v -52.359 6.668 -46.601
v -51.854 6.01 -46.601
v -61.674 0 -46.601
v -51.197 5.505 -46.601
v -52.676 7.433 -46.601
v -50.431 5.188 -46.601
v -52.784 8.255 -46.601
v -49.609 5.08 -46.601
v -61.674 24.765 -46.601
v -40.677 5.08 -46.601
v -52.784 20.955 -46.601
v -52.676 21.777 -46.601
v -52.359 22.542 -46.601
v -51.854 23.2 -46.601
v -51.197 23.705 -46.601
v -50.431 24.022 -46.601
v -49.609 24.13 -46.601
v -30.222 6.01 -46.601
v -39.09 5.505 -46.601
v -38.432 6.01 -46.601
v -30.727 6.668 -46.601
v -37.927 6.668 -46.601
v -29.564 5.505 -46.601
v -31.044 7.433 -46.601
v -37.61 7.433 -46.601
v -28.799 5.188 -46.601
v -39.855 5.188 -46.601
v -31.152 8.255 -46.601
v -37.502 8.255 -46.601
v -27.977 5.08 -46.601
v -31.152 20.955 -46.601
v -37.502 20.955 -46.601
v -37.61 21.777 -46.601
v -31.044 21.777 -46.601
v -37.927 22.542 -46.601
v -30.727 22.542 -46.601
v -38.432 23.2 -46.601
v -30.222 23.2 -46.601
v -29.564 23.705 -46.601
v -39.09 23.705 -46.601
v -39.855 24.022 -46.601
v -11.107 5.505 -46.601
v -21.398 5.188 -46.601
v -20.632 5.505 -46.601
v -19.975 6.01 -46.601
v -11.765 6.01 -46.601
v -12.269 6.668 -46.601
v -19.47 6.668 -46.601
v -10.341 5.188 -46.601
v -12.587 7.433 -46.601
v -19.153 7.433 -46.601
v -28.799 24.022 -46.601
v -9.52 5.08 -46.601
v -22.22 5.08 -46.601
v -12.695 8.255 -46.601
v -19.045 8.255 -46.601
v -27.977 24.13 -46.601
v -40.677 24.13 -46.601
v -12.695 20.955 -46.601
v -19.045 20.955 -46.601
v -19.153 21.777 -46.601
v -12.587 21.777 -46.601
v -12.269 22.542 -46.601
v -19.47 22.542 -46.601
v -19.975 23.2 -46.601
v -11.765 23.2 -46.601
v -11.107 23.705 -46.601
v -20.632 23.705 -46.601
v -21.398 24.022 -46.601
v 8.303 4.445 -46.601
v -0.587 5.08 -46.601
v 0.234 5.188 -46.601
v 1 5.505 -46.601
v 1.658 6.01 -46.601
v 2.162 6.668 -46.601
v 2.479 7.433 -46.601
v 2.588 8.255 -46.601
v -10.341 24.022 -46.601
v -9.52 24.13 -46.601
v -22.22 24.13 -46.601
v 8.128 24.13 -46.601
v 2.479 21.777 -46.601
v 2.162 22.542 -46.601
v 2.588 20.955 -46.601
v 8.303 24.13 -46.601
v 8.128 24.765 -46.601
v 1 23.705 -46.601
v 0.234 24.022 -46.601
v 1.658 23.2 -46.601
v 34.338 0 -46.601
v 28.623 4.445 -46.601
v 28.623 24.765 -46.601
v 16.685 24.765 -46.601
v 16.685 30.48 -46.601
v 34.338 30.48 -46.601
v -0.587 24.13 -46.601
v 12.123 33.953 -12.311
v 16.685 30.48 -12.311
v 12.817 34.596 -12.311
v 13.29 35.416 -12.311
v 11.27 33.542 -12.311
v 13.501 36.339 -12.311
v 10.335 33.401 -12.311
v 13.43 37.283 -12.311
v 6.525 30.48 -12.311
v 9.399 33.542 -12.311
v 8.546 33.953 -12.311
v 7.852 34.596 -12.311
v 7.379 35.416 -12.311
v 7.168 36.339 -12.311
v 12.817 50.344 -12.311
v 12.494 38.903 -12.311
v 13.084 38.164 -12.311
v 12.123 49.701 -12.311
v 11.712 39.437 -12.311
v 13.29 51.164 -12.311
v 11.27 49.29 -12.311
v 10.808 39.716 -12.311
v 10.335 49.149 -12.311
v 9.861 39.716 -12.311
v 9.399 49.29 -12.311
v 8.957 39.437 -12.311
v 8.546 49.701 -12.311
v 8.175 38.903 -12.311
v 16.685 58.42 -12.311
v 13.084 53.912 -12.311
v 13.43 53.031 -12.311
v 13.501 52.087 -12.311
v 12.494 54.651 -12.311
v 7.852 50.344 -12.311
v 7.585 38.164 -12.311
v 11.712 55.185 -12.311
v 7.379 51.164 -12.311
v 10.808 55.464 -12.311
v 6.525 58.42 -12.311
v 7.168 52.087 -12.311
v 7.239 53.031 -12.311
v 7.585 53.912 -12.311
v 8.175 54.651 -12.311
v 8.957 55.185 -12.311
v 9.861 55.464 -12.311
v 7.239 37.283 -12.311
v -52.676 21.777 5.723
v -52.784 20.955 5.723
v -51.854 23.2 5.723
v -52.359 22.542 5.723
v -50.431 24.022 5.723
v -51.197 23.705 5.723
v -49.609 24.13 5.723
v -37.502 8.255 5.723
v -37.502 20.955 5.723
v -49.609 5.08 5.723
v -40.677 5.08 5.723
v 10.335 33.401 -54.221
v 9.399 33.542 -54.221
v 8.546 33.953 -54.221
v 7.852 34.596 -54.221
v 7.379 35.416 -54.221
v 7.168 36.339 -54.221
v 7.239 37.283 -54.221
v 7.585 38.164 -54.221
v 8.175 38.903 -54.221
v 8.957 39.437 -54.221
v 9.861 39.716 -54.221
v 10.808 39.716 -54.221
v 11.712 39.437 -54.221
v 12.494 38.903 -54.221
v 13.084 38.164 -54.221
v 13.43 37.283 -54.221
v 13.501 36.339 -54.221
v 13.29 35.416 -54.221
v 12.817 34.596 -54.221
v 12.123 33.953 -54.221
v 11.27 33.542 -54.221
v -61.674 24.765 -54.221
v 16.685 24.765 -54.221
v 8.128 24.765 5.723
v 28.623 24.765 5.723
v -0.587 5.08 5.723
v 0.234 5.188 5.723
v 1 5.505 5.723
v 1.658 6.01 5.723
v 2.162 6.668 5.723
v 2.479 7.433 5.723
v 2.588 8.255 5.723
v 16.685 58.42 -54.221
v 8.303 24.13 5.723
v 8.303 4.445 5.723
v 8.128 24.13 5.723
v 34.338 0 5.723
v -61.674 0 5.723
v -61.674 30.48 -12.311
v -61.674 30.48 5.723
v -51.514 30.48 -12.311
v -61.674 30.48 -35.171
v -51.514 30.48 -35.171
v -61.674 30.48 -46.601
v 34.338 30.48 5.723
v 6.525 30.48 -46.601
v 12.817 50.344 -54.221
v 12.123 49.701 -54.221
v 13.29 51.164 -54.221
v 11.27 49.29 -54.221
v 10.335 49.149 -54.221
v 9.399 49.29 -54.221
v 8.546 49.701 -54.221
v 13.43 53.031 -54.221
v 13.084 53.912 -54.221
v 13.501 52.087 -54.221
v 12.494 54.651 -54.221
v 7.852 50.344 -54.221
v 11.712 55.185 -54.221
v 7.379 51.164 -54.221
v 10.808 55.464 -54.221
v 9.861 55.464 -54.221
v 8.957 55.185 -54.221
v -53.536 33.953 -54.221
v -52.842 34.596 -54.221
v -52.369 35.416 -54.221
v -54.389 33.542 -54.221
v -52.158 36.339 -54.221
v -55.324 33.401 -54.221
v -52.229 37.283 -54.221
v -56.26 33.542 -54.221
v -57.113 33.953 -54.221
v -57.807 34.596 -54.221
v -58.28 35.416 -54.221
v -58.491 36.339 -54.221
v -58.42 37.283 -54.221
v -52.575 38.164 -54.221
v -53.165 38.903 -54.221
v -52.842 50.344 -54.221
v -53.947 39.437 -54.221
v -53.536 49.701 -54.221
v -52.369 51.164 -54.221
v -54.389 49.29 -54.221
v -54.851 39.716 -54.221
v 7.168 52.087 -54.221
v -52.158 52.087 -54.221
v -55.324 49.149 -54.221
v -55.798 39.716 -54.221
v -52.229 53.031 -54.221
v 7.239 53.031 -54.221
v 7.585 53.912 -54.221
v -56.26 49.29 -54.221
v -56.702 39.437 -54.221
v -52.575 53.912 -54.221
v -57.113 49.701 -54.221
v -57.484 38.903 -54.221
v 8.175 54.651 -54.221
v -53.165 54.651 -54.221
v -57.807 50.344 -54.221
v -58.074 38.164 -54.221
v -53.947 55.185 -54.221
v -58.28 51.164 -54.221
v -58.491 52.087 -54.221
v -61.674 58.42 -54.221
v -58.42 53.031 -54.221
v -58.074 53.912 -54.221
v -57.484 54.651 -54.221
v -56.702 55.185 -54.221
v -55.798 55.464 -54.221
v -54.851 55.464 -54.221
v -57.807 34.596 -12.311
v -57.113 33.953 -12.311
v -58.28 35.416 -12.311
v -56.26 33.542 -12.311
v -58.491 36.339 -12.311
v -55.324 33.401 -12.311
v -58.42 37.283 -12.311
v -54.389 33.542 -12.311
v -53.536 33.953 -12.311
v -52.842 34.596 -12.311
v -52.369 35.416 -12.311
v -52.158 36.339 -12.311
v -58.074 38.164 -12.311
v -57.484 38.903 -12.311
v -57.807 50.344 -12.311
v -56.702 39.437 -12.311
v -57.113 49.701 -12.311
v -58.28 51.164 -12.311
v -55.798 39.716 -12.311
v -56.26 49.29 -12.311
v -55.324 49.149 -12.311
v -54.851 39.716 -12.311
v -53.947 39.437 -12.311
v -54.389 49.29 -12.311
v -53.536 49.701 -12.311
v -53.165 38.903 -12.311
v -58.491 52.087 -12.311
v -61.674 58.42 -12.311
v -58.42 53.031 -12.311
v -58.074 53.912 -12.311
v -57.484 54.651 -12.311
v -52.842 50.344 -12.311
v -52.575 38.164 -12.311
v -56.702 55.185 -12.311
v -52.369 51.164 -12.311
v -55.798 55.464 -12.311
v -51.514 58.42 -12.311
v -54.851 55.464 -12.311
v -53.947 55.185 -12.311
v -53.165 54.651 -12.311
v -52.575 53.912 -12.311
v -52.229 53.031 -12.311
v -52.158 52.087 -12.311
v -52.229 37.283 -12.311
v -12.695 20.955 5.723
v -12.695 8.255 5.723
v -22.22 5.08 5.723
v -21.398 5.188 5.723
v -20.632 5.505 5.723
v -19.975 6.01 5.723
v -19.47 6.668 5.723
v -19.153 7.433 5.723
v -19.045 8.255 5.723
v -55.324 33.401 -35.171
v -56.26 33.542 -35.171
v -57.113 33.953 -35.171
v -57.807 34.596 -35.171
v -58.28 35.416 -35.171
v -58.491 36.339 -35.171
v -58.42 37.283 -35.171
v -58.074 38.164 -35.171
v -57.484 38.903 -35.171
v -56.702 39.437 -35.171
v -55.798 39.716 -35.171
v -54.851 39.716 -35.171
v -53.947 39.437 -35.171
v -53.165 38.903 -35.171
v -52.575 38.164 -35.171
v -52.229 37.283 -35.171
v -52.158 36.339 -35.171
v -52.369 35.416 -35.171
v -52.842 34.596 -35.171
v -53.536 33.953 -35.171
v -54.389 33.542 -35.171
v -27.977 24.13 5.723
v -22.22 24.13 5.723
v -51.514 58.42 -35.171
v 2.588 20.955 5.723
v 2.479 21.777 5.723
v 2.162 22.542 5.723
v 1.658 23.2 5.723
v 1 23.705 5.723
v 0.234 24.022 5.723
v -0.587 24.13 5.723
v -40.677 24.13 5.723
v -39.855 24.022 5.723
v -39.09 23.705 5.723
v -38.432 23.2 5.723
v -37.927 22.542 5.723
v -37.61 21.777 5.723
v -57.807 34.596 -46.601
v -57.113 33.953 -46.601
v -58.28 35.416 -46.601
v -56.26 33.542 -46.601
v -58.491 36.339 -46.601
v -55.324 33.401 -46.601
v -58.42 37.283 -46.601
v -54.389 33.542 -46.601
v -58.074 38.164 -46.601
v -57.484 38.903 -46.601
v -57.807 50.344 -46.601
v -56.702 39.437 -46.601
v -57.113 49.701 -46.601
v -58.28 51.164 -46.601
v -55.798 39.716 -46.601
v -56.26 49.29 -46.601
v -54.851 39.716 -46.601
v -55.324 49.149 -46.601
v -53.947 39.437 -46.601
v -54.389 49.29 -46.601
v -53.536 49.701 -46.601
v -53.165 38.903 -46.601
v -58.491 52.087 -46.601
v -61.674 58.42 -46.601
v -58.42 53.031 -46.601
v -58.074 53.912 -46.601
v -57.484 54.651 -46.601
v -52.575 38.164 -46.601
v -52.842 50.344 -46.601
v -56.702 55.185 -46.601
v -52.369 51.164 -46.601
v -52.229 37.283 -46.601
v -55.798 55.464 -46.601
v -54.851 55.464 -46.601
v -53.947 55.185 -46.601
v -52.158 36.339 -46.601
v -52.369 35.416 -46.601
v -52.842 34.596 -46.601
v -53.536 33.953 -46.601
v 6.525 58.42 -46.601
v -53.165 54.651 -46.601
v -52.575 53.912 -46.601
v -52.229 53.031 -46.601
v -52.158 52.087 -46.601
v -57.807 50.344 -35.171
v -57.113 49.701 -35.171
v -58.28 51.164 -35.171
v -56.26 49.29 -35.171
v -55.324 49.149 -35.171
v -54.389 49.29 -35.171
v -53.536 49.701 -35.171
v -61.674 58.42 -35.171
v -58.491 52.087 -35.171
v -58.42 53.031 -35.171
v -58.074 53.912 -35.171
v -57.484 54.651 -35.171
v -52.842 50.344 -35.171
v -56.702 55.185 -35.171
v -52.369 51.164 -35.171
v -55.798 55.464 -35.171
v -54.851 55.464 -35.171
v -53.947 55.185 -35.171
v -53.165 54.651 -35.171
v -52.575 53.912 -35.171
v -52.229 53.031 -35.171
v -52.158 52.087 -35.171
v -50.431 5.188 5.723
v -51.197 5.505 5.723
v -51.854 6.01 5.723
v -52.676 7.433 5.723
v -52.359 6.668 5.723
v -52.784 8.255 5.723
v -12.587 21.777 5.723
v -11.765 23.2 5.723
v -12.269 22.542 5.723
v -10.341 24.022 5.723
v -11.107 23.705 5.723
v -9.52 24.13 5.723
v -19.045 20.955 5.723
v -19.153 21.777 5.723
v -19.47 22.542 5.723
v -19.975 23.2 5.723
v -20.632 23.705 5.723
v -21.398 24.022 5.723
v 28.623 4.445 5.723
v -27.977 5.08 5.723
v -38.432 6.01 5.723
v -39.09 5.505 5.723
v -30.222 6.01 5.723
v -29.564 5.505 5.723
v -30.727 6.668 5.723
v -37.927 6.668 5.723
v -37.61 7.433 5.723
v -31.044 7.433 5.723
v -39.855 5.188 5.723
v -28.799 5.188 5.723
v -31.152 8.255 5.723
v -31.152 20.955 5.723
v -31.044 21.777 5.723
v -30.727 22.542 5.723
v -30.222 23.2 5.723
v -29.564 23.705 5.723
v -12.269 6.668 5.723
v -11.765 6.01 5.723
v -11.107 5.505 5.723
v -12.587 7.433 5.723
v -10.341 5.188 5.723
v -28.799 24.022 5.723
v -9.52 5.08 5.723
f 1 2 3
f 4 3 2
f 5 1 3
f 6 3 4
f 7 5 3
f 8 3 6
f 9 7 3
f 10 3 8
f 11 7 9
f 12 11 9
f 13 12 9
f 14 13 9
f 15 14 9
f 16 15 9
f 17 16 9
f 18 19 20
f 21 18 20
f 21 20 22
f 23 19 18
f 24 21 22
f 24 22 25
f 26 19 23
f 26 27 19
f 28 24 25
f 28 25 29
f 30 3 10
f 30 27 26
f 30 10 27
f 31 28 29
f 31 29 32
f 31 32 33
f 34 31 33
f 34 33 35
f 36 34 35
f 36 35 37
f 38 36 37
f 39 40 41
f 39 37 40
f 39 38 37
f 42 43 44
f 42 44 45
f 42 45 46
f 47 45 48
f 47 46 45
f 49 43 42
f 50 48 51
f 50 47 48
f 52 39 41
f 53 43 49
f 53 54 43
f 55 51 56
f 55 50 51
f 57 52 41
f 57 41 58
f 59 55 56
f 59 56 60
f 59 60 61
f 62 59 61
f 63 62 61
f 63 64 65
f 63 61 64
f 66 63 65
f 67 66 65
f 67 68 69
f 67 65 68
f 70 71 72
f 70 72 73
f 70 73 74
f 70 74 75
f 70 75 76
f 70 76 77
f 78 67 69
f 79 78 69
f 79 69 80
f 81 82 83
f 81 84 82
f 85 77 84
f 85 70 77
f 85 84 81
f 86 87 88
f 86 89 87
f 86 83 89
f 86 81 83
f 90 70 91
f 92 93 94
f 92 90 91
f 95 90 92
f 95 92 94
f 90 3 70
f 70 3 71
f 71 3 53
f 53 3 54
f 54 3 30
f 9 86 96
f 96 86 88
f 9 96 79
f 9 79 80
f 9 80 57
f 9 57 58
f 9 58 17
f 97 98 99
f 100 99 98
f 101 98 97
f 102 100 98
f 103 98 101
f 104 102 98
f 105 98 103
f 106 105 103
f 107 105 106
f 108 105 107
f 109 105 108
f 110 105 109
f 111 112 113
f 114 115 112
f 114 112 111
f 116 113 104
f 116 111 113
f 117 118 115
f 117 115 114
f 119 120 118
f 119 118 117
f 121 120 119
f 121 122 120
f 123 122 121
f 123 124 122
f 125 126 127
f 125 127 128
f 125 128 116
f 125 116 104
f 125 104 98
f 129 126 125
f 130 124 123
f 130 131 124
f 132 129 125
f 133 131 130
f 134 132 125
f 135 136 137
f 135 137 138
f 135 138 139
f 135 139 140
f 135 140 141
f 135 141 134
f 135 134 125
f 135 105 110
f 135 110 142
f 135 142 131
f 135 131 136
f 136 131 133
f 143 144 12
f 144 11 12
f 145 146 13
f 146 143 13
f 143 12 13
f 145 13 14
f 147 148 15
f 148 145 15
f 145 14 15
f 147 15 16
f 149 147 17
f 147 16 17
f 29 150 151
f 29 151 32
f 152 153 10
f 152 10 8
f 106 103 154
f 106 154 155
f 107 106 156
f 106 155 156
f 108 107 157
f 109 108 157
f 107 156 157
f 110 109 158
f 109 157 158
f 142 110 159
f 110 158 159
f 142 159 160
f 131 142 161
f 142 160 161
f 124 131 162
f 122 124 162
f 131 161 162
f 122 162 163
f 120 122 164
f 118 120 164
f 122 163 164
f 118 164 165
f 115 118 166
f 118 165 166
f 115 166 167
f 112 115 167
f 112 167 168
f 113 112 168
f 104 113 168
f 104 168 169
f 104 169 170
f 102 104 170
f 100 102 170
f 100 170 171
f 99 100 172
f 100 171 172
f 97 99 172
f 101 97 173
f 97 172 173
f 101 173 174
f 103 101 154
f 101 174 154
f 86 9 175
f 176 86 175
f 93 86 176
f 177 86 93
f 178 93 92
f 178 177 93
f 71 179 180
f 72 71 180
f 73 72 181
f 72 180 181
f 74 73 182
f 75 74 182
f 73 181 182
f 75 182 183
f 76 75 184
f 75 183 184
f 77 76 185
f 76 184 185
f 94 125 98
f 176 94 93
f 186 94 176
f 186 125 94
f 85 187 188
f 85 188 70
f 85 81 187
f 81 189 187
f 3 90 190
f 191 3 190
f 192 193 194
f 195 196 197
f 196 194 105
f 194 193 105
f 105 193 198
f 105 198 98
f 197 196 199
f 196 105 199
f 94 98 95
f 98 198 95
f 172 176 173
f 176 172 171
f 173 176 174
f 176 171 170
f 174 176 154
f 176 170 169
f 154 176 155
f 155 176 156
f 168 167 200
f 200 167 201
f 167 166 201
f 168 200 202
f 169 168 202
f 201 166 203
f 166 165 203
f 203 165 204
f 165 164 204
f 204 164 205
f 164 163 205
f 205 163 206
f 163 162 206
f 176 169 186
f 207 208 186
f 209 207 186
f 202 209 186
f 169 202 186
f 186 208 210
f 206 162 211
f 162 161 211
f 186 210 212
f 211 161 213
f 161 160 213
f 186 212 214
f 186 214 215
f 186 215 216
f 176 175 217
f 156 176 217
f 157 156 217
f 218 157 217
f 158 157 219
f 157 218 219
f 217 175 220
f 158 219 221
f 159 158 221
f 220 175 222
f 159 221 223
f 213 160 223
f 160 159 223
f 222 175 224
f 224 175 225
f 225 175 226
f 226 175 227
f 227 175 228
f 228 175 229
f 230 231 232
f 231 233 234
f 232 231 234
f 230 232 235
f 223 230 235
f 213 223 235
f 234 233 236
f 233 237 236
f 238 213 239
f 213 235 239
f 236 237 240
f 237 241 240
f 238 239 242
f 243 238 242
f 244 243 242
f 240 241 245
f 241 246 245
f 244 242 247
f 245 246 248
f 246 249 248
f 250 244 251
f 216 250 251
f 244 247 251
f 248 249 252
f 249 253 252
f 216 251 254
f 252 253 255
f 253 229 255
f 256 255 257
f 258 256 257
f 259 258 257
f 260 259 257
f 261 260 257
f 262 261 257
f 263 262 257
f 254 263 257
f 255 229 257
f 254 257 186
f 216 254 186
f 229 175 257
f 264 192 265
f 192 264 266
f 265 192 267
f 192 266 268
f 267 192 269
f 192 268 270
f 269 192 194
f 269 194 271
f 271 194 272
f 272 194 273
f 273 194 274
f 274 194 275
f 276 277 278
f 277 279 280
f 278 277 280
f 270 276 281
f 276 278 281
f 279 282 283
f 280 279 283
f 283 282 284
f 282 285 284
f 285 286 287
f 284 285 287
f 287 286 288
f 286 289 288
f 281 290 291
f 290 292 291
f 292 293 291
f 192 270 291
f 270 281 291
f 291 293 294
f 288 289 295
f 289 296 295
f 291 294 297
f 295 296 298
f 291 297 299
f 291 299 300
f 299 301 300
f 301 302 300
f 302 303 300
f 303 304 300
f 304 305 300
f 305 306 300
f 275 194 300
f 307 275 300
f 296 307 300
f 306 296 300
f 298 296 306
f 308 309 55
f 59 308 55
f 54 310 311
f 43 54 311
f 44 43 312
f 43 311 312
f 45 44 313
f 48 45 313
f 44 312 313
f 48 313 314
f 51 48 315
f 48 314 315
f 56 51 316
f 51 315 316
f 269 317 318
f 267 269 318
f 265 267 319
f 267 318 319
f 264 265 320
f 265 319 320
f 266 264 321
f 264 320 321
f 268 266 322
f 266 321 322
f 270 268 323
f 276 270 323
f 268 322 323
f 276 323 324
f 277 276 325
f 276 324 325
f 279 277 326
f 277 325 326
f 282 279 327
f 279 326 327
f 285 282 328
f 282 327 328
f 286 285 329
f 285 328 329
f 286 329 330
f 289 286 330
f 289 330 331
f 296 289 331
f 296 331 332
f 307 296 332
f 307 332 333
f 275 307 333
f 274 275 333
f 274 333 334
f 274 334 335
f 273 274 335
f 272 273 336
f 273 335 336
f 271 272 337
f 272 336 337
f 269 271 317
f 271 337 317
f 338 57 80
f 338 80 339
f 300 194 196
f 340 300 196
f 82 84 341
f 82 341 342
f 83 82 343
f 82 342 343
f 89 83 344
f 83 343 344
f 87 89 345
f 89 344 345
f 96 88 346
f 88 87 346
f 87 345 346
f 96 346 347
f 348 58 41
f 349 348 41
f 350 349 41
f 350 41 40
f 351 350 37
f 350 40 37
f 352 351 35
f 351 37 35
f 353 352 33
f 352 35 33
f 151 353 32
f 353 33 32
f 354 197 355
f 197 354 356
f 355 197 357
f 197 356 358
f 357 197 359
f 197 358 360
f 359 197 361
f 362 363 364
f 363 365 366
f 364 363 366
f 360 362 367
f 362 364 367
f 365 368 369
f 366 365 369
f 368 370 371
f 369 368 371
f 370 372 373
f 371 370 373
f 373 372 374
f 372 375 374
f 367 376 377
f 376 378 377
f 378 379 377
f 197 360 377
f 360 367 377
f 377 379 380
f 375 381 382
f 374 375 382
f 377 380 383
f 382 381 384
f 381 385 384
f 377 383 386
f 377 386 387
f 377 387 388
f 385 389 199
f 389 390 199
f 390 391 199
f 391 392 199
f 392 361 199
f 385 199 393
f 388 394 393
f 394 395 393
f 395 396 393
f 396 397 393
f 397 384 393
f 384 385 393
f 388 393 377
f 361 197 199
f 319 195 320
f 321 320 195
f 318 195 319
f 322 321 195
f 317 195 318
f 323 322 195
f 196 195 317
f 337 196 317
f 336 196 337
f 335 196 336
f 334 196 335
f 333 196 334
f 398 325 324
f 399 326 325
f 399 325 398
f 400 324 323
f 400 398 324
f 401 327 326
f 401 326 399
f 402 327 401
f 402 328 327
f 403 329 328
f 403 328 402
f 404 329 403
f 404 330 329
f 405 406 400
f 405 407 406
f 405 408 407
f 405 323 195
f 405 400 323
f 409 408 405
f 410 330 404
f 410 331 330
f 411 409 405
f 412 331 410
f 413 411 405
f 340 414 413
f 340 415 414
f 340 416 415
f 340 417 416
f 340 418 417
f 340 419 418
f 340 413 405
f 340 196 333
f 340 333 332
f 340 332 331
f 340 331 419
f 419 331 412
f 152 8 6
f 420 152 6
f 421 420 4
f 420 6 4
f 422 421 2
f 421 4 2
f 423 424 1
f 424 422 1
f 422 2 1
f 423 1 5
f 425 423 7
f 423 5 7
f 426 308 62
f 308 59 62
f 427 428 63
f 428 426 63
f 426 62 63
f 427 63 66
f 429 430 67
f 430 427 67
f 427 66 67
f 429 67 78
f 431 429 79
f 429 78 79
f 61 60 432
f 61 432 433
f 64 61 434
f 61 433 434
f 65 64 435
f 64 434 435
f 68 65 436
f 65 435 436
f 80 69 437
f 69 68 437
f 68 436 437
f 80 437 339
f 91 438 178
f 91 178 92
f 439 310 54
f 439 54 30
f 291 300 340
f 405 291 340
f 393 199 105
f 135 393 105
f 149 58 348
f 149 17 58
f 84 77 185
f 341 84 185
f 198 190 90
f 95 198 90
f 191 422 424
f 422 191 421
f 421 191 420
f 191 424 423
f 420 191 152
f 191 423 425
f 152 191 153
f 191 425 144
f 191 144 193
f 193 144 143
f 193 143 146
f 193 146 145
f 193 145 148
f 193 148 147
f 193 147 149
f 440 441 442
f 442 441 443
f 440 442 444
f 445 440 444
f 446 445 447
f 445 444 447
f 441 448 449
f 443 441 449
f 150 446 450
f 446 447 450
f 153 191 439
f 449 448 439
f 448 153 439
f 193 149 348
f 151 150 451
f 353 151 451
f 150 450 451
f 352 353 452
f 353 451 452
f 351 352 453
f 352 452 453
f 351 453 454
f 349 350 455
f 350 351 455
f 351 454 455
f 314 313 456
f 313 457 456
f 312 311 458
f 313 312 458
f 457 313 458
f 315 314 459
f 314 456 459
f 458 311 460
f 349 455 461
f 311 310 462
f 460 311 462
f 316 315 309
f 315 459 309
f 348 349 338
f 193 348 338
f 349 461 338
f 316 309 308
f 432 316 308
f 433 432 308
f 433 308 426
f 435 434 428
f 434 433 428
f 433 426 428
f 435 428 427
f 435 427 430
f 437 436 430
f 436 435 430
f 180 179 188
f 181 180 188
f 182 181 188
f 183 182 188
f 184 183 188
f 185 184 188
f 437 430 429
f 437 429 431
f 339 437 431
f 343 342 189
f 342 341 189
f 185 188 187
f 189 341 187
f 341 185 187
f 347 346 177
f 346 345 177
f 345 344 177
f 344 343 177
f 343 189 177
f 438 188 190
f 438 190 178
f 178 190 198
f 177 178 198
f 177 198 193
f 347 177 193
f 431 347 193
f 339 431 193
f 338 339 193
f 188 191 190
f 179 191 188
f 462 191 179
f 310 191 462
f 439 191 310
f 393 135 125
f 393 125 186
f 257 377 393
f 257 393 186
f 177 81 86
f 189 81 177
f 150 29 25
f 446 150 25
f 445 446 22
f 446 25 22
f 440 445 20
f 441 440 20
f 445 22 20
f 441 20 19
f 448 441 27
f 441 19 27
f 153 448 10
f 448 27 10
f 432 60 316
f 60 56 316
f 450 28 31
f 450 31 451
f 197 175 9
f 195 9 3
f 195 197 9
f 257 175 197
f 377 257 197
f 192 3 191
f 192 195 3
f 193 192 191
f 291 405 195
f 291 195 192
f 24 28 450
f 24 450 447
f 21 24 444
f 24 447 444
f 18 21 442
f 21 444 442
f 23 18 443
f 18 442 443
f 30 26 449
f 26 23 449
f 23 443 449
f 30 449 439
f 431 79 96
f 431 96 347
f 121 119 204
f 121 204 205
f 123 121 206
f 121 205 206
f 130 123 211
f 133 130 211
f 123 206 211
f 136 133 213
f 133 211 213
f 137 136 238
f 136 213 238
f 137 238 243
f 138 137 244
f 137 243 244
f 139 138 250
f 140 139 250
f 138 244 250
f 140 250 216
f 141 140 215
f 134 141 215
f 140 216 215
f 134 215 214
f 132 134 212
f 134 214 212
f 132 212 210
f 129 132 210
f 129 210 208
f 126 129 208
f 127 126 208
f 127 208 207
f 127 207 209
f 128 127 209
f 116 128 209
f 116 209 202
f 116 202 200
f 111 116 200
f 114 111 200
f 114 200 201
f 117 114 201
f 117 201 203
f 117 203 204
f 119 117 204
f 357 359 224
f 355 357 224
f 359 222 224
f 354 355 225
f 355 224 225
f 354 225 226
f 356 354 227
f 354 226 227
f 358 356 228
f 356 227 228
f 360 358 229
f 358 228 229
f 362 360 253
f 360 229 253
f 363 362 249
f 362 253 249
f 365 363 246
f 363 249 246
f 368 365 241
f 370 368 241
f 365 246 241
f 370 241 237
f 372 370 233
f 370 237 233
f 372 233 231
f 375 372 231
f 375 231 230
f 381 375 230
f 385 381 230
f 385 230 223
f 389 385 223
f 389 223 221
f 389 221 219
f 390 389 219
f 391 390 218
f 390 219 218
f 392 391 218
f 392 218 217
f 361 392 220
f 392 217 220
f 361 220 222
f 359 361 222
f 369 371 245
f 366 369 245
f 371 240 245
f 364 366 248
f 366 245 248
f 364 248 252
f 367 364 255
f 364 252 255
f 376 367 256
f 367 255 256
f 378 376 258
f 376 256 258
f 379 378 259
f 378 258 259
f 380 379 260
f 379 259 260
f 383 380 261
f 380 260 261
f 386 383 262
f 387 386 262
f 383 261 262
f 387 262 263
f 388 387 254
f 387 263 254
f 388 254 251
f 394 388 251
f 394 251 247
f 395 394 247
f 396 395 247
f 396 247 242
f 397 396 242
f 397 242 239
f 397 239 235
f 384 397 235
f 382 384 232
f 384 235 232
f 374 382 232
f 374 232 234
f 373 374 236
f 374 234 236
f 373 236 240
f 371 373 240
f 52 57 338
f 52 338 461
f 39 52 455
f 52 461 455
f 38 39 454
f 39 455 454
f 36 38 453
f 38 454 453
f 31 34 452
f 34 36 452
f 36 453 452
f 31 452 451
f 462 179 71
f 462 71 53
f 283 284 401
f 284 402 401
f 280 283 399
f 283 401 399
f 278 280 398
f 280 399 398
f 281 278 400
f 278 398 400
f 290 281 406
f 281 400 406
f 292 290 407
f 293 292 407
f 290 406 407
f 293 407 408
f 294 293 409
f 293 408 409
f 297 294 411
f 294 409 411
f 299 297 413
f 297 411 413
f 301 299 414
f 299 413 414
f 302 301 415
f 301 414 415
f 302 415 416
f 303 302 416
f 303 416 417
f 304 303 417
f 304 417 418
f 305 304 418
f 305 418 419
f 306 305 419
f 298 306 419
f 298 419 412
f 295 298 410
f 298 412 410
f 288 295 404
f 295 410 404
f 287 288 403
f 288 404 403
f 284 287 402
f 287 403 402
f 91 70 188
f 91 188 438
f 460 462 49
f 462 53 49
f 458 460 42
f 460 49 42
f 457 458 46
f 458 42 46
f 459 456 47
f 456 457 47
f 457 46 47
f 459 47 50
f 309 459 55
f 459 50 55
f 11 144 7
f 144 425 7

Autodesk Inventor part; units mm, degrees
ref_plane "YZ Plane" through (0, 0, 0) normal (1, 0, 0) x (0, 1, 0)
ref_plane "XZ Plane" through (0, 0, 0) normal (0, 1, 0) x (-1, 0, 0)
ref_plane "XY Plane" through (0, 0, 0) normal (0, 0, 1) x (1, 0, 0)
sketch "Sketch1" plane through (0, 0, 0) normal (0, 1, 0) x (-1, 0, 0)
  line L0 (59.1344, 5.7229) -> (-34.3376, 5.7229)
  line L1 (-34.3376, 5.7229) -> (-34.3376, -46.6011)
  line L2 (-34.3376, -46.6011) -> (59.1344, -46.6011)
  line L3 (59.1344, -46.6011) -> (59.1344, 5.7229)
  point P0 (0, 0)
  dimension "d0" = 52.324
  dimension "d1" = 93.472
extrude "Extrusion1" add sketch "Sketch1" along normal blind 5.08
sketch "Sketch2" plane through (0, 5.08, 0) normal (0, 1, 0) x (1, 0, 0)
  line L0 (34.3376, -5.7229) -> (34.3376, 46.6011) projected
  line L1 (-59.1344, -5.7229) -> (34.3376, -5.7229) projected
  line L2 (34.3376, 46.6011) -> (27.9876, 46.6011)
  line L3 (27.9876, 46.6011) -> (27.9876, -5.7229)
  line L4 (27.9876, -5.7229) -> (34.3376, -5.7229)
  line L5 (34.3376, -5.7229) -> (34.3376, 46.6011)
  line L6 (8.9376, 46.6011) -> (2.5876, 46.6011)
  line L7 (2.5876, 46.6011) -> (2.5876, -5.7229)
  line L8 (2.5876, -5.7229) -> (8.9376, -5.7229)
  line L9 (8.9376, -5.7229) -> (8.9376, 46.6011)
  line L10 (34.3376, 46.6011) -> (-59.1344, 46.6011) projected
  line L11 (-59.1344, 46.6011) -> (-59.1344, -5.7229) projected
  line L12 (-52.7844, 46.6011) -> (-59.1344, 46.6011)
  line L13 (-59.1344, 46.6011) -> (-59.1344, -5.7229)
  line L14 (-59.1344, -5.7229) -> (-52.7844, -5.7229)
  line L15 (-52.7844, -5.7229) -> (-52.7844, 46.6011)
  point P0 (0, 0)
  dimension "d4" = 6.35
  dimension "d5" = 19.05
  dimension "d6" = 6.35
  dimension "d7" = 6.35
extrude "Extrusion2" add sketch "Sketch2" along normal blind 19.05 contours L1 L3 L2 L0 | L1 L7 L6 L9 | L1 L11 L10 L15
sketch "Sketch3" plane through (0, 24.13, 0) normal (0, 1, 0) x (1, 0, 0)
  line L0 (34.3376, -5.7229) -> (34.3376, 46.6011) projected
  line L1 (-59.1344, 46.6011) -> (-59.1344, -5.7229) projected
  line L2 (34.3376, 46.6011) -> (-59.1344, 46.6011)
  line L3 (-59.1344, 46.6011) -> (-59.1344, -5.7229)
  line L4 (-59.1344, -5.7229) -> (34.3376, -5.7229)
  line L5 (34.3376, -5.7229) -> (34.3376, 46.6011)
  point P0 (0, 0)
extrude "Extrusion3" add sketch "Sketch3" along normal blind 6.35
sketch "Sketch4" plane through (0, 30.48, 0) normal (0, 1, 0) x (1, 0, 0)
  point P0 (0, 0)
sketch "Sketch5" plane through (0, 30.48, 0) normal (0, 1, 0) x (1, 0, 0)
  line L0 (-59.1344, -5.7229) -> (34.3376, -5.7229) projected
  line L1 (-59.1344, -5.7229) -> (-51.5144, -5.7229)
  line L2 (-51.5144, -5.7229) -> (-51.5144, 46.6011)
  line L3 (-51.5144, 46.6011) -> (-59.1344, 46.6011)
  line L4 (-59.1344, 46.6011) -> (-59.1344, -5.7229)
  line L5 (-52.7844, -5.7229) -> (2.5876, -5.7229) projected
  line L6 (6.5246, -5.7229) -> (14.1446, -5.7229)
  line L7 (14.1446, -5.7229) -> (14.1446, 46.6011)
  line L8 (14.1446, 46.6011) -> (6.5246, 46.6011)
  line L9 (6.5246, 46.6011) -> (6.5246, -5.7229)
  point P0 (0, 0)
  dimension "d12" = 7.62
  dimension "d13" = 7.62
  dimension "d14" = 58.039
extrude "Extrusion4" add sketch "Sketch5" along normal blind 27.94
sketch "Sketch6" plane through (0, 58.42, 0) normal (0, 1, 0) x (1, 0, 0)
  point P0 (0, 0)
sketch "Sketch7" plane through (0, 58.42, 0) normal (0, 1, 0) x (1, 0, 0)
  line L0 (-59.1344, -5.7229) -> (-51.5144, -5.7229) projected
  line L1 (-51.5144, -5.7229) -> (-51.5144, 46.6011) projected
  line L2 (-59.1344, -5.7229) -> (-51.5144, -5.7229)
  line L3 (-51.5144, -5.7229) -> (-51.5144, 12.3111)
  line L4 (-51.5144, 12.3111) -> (-59.1344, 12.3111)
  line L5 (-59.1344, 12.3111) -> (-59.1344, -5.7229)
  line L6 (6.5246, -5.7229) -> (6.5246, 46.6011) projected
  line L7 (14.1446, -5.7229) -> (14.1446, 46.6011) projected
  line L8 (6.5246, -5.7229) -> (14.1446, -5.7229)
  line L9 (14.1446, -5.7229) -> (14.1446, 12.3111)
  line L10 (14.1446, 12.3111) -> (6.5246, 12.3111)
  line L11 (6.5246, 12.3111) -> (6.5246, -5.7229)
  point P0 (0, 0)
  dimension "d17" = 18.034
extrude "Extrusion5" cut sketch "Sketch7" against normal blind 27.94
sketch "Sketch8" plane through (0, 58.42, 0) normal (0, 1, 0) x (1, 0, 0)
  line L0 (34.3376, 46.6011) -> (-59.1344, 46.6011) projected
  line L1 (-51.5144, 46.6011) -> (-51.5144, 12.3111) projected
  line L2 (-59.1344, 46.6011) -> (-51.5144, 46.6011)
  line L3 (-51.5144, 46.6011) -> (-51.5144, 35.1711)
  line L4 (-51.5144, 35.1711) -> (-59.1344, 35.1711)
  line L5 (-59.1344, 35.1711) -> (-59.1344, 46.6011)
  point P0 (0, 0)
  dimension "d20" = 11.43
extrude "Extrusion6" cut sketch "Sketch8" against normal blind 27.94
sketch "Sketch9" plane through (34.3376, 0, -46.6011) normal (0, 0, -1) x (-1, 0, 0)
  line L0 (93.472, 30.48) -> (0, 30.48) projected
  line L1 (27.813, 30.48) -> (20.193, 30.48) projected
  line L2 (93.472, 30.48) -> (20.193, 30.48)
  line L3 (20.193, 30.48) -> (20.193, 24.13)
  line L4 (6.35, 24.13) -> (25.4, 24.13) projected
  line L5 (31.75, 24.13) -> (87.122, 24.13) projected
  line L6 (25.4, 24.13) -> (31.75, 24.13)
  line L7 (87.122, 5.08) -> (87.122, 24.13) projected
  line L8 (31.75, 24.13) -> (87.122, 24.13)
  line L9 (93.472, 0) -> (93.472, 30.48) projected
  line L10 (87.122, 24.13) -> (93.472, 24.13)
  point P0 (34.3376, 0)
extrude "Extrusion7" add sketch "Sketch9" along normal blind 7.62
sketch "Sketch10" plane through (0, 30.48, 0) normal (0, 1, 0) x (1, 0, 0)
  line L0 (14.1446, 46.6011) -> (14.1446, 54.2211) projected
  line L1 (-59.1344, 54.2211) -> (14.1446, 54.2211) projected
  line L2 (14.1446, 46.6011) -> (-59.1344, 46.6011)
  line L3 (-59.1344, 46.6011) -> (-59.1344, 54.2211)
  line L4 (-59.1344, 54.2211) -> (14.1446, 54.2211)
  line L5 (14.1446, 54.2211) -> (14.1446, 46.6011)
  point P0 (0, 0)
extrude "Extrusion8" add sketch "Sketch10" along normal blind 27.94
fillet "Fillet1" radius 3.175 4 edges at (2.5876, 5.08, -20.4391) (-52.7844, 5.08, -20.4391) (2.5876, 24.13, -20.4391) (-52.7844, 24.13, -20.4391)
sketch "Sketch11" plane through (-59.1344, 58.42, -12.3111) normal (0, 0, 1) x (1, 0, 0)
  point P0 (59.1344, -58.42)
sketch "Sketch12" plane through (-59.1344, 58.42, -12.3111) normal (0, 0, 1) x (1, 0, 0)
  circle A0 centre (3.81, -6.096) radius 2.54
  line L0 (0, 0) -> (7.62, 0) projected
  line L1 (0, -27.94) -> (0, 0) projected
  circle A1 centre (3.81, -21.844) radius 2.54
  line L2 (0, -27.94) -> (7.62, -27.94) projected
  circle A2 centre (69.469, -6.096) radius 2.54
  line L3 (65.659, 0) -> (73.279, 0) projected
  line L4 (73.279, 0) -> (73.279, -27.94) projected
  circle A3 centre (69.469, -21.844) radius 2.54
  line L5 (0, -27.94) -> (93.472, -27.94) projected
  point P0 (59.1344, -58.42)
  dimension "d29" = 6.096
  dimension "d30" = 3.81
  dimension "d31" = 5.08
  dimension "d32" = 5.08
  dimension "d33" = 3.81
  dimension "d34" = 6.096
  dimension "d35" = 5.08
  dimension "d36" = 6.096
  dimension "d37" = 3.81
  dimension "d38" = 5.08
  dimension "d39" = 3.81
  dimension "d40" = 6.096
hole "Hole1" at (-55.3244, 52.324, -12.3111) at (-55.3244, 36.576, -12.3111) at (10.3346, 52.324, -12.3111) at (10.3346, 36.576, -12.3111) direction (0, 0, -1) diameter 6.35 end through all
sketch "Sketch13" plane through (-59.1344, 0, -46.6011) normal (-1, 0, 0) x (0, 0, 1)
  line L0 (-7.62, 24.13) -> (-7.62, 58.42) projected
  line L1 (-7.62, 58.42) -> (-7.62, 24.13)
  line L2 (0, 24.13) -> (-7.62, 24.13) projected
  line L3 (-7.62, 24.13) -> (0, 24.13)
  line L4 (0, 0) -> (0, 24.13) projected
  line L5 (0, 24.13) -> (0, 0)
  line L6 (0, 0) -> (52.324, 0) projected
  line L7 (0, 0) -> (52.324, 0)
  line L8 (52.324, 0) -> (52.324, 30.48) projected
  line L9 (52.324, 0) -> (52.324, 30.48)
  line L10 (34.29, 30.48) -> (34.29, 58.42) projected
  line L11 (52.324, 30.48) -> (34.29, 30.48)
  line L12 (34.29, 30.48) -> (34.29, 58.42)
  line L13 (34.29, 58.42) -> (11.43, 58.42) projected
  line L14 (34.29, 58.42) -> (11.43, 58.42)
  line L15 (11.43, 30.48) -> (11.43, 58.42) projected
  line L16 (11.43, 58.42) -> (11.43, 30.48)
  line L17 (11.43, 30.48) -> (0, 30.48) projected
  line L18 (11.43, 30.48) -> (0, 30.48)
  line L19 (0, 30.48) -> (0, 58.42) projected
  line L20 (0, 30.48) -> (0, 58.42)
  line L21 (34.29, 58.42) -> (-7.62, 58.42) projected
  line L22 (0, 58.42) -> (-7.62, 58.42)
  point P0 (46.6011, 0)
extrude "Extrusion9" add sketch "Sketch13" along normal blind 2.54 contours L0 L21 L19 L17 L15 L13 L10 L11 L8 L6 L4 L2
sketch "Sketch14" plane through (14.1446, 24.13, -46.6011) normal (1, 0, 0) x (0, 0, -1)
  line L0 (-34.29, 34.29) -> (7.62, 34.29) projected
  line L1 (7.62, 0) -> (7.62, 34.29) projected
  line L2 (-34.29, 34.29) -> (7.62, 34.29)
  line L3 (7.62, 34.29) -> (7.62, 0)
  line L4 (7.62, 0) -> (-34.29, 0)
  line L5 (-34.29, 0) -> (-34.29, 34.29)
  line L6 (0, 0) -> (7.62, 0) projected
  line L7 (0, 6.35) -> (-34.29, 6.35) projected
  line L8 (0, 0) -> (-34.29, 0)
  line L9 (-34.29, 0) -> (-34.29, 6.35)
  line L10 (-34.29, 6.35) -> (0, 6.35)
  line L11 (0, 6.35) -> (0, 0)
  point P0 (-46.6011, -24.13)
extrude "Extrusion10" add sketch "Sketch14" along normal blind 2.54 contours L0 L1 L4 L11 L7 L5
sketch "Sketch15" plane through (0, 5.08, 0) normal (0, 1, 0) x (1, 0, 0)
  point P0 (0, 0)
sketch "Sketch16" plane through (0, 5.08, 0) normal (0, 1, 0) x (1, 0, 0)
  line L0 (34.3376, 46.6011) -> (-61.6744, 46.6011) projected
  line L1 (-61.6744, -5.7229) -> (34.3376, -5.7229) projected
  line L2 (-37.502, 46.6011) -> (-31.152, 46.6011)
  line L3 (-31.152, 46.6011) -> (-31.152, -5.7229)
  line L4 (-31.152, -5.7229) -> (-37.502, -5.7229)
  line L5 (-37.502, -5.7229) -> (-37.502, 46.6011)
  line L6 (-19.0447, -5.7229) -> (-12.6947, -5.7229)
  line L7 (-12.6947, -5.7229) -> (-12.6947, 46.6011)
  line L8 (-12.6947, 46.6011) -> (-19.0447, 46.6011)
  line L9 (-19.0447, 46.6011) -> (-19.0447, -5.7229)
  line L10 (-49.6094, -5.7229) -> (-49.6094, 46.6011) projected
  point P0 (0, 0)
  dimension "d52" = 6.35
  dimension "d53" = 6.35
  dimension "d54" = 12.1073
  dimension "d55" = 12.1073
extrude "Extrusion11" add sketch "Sketch16" along normal blind 25.4 contours L7 L1 L9 L0 | L3 L1 L5 L0
fillet "Fillet2" radius 3.175 1 edges at (-37.502, 5.08, -20.4391)
fillet "Fillet3" radius 3.175 1 edges at (-19.0447, 5.08, -20.4391)
fillet "Fillet4" radius 3.175 1 edges at (-31.152, 24.13, -20.4391)
fillet "Fillet5" radius 3.175 1 edges at (-12.6947, 24.13, -20.4391)
fillet "Fillet6" radius 3.175 1 edges at (-12.6947, 5.08, -20.4391)
fillet "Fillet7" radius 3.175 1 edges at (-31.152, 5.08, -20.4391)
fillet "Fillet8" radius 3.175 1 edges at (-37.502, 24.13, -20.4391)
fillet "Fillet9" radius 3.175 1 edges at (-19.0447, 24.13, -20.4391)
sketch "Sketch17" plane through (27.9876, 5.08, -46.6011) normal (-1, 0, 0) x (0, 0, 1)
  line L0 (0, 19.05) -> (-7.62, 19.05) projected
  line L1 (52.324, 0) -> (0, 0) projected
  line L2 (0, 19.05) -> (52.324, 19.05)
  line L3 (52.324, 19.05) -> (52.324, 0)
  line L4 (52.324, 0) -> (0, 0)
  line L5 (0, 0) -> (0, 19.05)
  point P0 (46.6011, -5.08)
extrude "Extrusion12" cut sketch "Sketch17" against normal blind 0.635
sketch "Sketch18" plane through (8.9376, 5.08, 5.7229) normal (1, 0, 0) x (0, 0, -1)
  line L0 (52.324, 15.875) -> (52.324, 19.05) projected
  line L1 (0, 0) -> (52.324, 0) projected
  line L2 (52.324, 19.05) -> (0, 19.05)
  line L3 (0, 19.05) -> (0, 0)
  line L4 (0, 0) -> (52.324, 0)
  line L5 (52.324, 0) -> (52.324, 19.05)
  point P0 (5.7229, -5.08)
extrude "Extrusion13" cut sketch "Sketch18" against normal blind 0.635
sketch "Sketch19" plane through (0, 24.13, 0) normal (0, -1, 0) x (1, 0, 0)
  line L0 (28.6226, 5.7229) -> (28.6226, -46.6011) projected
  line L1 (-61.6744, 5.7229) -> (34.3376, 5.7229) projected
  line L2 (28.6226, -46.6011) -> (8.1284, -46.6011)
  line L3 (8.1284, -46.6011) -> (8.1284, 5.7229)
  line L4 (8.1284, 5.7229) -> (28.6226, 5.7229)
  line L5 (28.6226, 5.7229) -> (28.6226, -46.6011)
  point P0 (0, 0)
extrude "Extrusion14" cut sketch "Sketch19" against normal blind 0.635
sketch "Sketch20" plane through (0, 5.08, 0) normal (0, 1, 0) x (1, 0, 0)
  line L0 (28.6226, -5.7229) -> (28.6226, 46.6011) projected
  line L1 (16.6846, 46.6011) -> (8.3026, 46.6011) projected
  line L2 (28.6226, -5.7229) -> (8.3026, -5.7229)
  line L3 (8.3026, -5.7229) -> (8.3026, 46.6011)
  line L4 (8.3026, 46.6011) -> (28.6226, 46.6011)
  line L5 (28.6226, 46.6011) -> (28.6226, -5.7229)
  point P0 (0, 0)
extrude "Extrusion15" cut sketch "Sketch20" against normal blind 0.635
sketch "Sketch21" plane through (0, 24.13, 0) normal (0, -1, 0) x (1, 0, 0)
  line L0 (16.6846, -46.6011) -> (16.6846, -54.2211) projected
  line L1 (-49.6094, -46.6011) -> (-61.6744, -46.6011) projected
  line L2 (16.6846, -54.2211) -> (-61.6744, -54.2211)
  line L3 (-61.6744, -54.2211) -> (-61.6744, -46.6011)
  line L4 (-61.6744, -46.6011) -> (16.6846, -46.6011)
  line L5 (16.6846, -46.6011) -> (16.6846, -54.2211)
  point P0 (0, 0)
extrude "Extrusion16" cut sketch "Sketch21" against normal blind 0.635
properties part number "Nov 21 holder for arm server (resized hole)"
